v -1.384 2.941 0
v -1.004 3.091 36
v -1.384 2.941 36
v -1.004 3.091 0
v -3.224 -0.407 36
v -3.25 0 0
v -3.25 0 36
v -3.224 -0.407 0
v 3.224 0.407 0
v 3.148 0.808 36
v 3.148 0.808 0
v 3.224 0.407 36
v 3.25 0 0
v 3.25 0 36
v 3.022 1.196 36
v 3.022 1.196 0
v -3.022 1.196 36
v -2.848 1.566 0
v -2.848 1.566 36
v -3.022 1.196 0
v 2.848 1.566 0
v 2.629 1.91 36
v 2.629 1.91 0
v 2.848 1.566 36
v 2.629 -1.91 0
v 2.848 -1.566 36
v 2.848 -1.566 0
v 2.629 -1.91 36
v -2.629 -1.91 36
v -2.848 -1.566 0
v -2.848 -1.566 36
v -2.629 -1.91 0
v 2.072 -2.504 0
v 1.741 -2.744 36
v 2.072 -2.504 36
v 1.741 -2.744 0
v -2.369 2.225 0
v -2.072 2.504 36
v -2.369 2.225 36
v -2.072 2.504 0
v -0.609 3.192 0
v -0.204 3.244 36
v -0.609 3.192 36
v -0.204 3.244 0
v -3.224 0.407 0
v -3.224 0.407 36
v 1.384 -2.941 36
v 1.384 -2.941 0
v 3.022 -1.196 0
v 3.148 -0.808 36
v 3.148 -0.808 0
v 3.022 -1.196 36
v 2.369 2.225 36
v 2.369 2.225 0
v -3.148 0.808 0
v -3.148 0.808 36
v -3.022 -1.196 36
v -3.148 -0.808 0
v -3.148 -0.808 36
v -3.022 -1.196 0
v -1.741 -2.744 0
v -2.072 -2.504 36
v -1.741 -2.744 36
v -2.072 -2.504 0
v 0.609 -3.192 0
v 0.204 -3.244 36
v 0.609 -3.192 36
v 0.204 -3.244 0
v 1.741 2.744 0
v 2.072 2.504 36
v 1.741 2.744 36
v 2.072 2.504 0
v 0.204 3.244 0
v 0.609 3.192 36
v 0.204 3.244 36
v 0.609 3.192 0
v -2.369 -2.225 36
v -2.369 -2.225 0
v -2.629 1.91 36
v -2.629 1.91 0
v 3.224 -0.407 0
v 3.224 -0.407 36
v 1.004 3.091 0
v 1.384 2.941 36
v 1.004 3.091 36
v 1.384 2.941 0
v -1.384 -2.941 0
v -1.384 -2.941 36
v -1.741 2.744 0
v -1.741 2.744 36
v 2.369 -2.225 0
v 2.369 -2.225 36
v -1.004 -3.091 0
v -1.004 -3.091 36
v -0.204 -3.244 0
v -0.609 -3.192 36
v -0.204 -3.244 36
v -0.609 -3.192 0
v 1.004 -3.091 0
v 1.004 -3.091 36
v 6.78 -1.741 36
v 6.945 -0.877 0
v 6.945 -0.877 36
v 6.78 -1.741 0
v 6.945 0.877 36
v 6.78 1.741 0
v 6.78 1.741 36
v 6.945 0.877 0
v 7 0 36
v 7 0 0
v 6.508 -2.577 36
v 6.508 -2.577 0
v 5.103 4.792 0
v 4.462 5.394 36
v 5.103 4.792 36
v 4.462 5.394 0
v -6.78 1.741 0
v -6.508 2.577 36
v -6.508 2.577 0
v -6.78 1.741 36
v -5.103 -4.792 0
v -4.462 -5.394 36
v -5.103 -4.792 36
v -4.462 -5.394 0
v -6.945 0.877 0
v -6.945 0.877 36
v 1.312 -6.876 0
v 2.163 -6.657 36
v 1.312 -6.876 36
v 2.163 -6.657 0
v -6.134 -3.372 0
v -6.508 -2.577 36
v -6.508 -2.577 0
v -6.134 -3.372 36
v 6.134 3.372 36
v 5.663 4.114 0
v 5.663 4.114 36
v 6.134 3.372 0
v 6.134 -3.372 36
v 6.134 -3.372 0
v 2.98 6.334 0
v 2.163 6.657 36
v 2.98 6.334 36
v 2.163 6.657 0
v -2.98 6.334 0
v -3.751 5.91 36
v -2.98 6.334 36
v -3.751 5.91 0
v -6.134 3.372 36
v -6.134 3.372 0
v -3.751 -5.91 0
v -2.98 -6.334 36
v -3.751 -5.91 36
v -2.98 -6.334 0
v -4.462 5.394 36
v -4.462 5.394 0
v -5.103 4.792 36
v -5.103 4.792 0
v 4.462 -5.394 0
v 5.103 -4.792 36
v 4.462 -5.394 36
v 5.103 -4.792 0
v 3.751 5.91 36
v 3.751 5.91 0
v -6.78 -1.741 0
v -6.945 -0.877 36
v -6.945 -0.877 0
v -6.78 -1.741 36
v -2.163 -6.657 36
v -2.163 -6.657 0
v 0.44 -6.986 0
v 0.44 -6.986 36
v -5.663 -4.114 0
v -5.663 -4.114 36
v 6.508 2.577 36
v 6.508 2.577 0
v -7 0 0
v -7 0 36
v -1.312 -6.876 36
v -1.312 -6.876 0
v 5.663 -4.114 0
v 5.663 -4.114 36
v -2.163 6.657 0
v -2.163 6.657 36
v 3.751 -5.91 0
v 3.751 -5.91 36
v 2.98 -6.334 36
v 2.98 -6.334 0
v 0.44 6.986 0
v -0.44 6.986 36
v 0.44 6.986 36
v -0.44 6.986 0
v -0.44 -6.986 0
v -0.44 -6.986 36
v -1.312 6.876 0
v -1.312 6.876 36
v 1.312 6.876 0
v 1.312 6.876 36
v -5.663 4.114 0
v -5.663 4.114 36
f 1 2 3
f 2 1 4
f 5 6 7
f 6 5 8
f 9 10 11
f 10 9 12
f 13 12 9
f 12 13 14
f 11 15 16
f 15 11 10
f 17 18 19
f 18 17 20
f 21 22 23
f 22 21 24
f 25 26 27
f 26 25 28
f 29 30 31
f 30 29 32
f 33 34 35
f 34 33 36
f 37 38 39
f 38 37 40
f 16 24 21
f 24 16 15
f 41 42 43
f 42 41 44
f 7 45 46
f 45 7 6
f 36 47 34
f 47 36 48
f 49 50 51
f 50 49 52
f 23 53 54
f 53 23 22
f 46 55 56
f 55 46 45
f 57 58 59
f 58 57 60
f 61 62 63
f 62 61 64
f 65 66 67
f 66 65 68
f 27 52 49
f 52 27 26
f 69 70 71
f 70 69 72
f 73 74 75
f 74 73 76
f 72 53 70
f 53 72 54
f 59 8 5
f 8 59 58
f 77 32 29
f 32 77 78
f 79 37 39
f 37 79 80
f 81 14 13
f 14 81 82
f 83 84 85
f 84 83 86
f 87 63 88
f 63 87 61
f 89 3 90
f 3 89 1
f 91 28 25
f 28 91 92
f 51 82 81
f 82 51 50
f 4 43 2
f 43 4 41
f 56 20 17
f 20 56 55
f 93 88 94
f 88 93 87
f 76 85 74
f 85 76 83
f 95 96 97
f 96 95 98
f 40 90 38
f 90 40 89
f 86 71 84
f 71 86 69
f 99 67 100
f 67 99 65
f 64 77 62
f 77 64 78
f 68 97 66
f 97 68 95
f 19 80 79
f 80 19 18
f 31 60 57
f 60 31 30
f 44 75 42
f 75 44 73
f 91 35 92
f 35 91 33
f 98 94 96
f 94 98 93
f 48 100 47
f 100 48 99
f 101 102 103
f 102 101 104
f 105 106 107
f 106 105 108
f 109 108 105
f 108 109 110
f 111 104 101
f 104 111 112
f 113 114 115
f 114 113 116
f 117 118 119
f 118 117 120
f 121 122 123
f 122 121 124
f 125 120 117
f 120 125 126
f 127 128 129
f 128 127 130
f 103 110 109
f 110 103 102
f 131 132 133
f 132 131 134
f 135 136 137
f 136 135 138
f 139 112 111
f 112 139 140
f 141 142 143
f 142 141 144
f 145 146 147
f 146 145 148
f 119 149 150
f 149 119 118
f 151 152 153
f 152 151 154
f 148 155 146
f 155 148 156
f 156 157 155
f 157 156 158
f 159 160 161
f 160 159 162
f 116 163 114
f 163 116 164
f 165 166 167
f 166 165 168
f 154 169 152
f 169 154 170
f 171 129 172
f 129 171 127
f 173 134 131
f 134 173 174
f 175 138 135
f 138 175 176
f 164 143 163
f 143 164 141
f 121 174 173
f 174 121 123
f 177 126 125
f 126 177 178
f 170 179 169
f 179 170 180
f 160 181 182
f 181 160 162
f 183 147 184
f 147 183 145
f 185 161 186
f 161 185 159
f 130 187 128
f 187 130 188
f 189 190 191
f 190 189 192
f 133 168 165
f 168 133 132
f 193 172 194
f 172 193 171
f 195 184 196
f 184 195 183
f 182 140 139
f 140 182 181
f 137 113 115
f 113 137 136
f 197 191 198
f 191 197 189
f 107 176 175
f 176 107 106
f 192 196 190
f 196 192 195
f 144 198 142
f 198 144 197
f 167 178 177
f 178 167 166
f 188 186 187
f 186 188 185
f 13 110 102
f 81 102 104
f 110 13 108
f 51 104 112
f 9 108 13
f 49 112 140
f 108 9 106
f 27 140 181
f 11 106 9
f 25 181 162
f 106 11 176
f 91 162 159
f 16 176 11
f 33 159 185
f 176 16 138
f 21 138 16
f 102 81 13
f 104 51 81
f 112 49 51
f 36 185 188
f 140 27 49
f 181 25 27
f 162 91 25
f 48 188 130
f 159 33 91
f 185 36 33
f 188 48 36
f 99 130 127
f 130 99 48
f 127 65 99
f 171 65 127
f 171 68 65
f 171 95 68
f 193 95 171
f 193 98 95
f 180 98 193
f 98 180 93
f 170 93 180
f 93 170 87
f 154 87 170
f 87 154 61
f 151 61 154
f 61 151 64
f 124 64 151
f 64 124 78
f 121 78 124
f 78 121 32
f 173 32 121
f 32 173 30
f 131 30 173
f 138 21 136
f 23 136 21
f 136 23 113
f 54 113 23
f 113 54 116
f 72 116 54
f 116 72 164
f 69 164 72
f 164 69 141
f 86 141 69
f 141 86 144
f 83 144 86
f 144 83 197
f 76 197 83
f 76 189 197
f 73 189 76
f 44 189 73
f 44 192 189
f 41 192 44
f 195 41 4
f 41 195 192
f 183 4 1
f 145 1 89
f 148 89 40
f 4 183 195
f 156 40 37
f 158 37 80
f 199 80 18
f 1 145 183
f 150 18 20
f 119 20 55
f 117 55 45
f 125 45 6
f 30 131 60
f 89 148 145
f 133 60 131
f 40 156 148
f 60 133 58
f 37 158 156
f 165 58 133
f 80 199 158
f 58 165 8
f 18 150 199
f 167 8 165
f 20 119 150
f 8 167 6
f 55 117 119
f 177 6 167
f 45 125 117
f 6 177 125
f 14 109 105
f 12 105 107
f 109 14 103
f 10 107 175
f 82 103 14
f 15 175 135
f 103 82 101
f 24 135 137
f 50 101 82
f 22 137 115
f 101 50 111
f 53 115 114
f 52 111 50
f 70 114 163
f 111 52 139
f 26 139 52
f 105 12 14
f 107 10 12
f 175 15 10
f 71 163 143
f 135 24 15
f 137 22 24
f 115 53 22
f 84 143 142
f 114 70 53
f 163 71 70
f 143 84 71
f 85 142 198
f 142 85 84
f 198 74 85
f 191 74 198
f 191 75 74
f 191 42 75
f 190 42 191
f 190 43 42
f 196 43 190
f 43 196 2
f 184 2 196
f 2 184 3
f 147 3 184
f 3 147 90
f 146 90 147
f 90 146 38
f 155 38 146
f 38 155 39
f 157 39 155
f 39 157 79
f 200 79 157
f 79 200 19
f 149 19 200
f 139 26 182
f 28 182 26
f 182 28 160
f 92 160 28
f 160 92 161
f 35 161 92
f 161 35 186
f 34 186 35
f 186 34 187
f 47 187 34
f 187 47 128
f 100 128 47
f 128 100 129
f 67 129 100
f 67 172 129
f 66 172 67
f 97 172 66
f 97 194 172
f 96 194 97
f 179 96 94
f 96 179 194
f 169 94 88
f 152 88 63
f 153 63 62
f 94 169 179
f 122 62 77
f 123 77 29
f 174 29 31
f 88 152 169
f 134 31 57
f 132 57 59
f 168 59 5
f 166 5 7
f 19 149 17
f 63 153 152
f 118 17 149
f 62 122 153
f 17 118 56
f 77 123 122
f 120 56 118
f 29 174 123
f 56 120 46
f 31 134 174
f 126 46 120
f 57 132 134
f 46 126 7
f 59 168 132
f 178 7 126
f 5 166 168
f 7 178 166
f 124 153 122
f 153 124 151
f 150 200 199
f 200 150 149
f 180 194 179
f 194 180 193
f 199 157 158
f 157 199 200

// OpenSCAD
$fn = 50;


difference() {
	union() {
		*color(alpha = 1.0000000000, c = "gray") {
			translate(v = [0, 7, 0]) {
				linear_extrude(height = 1) {
					text(font = "Arial:style=Bold", halign = "center", size = 4.5000000000, text = "COMMENT plate main", valign = "center");
				}
			}
		}
		cylinder(h = 36, r = 7.0000000000);
	}
	union() {
		*color(alpha = 1.0000000000, c = "gray") {
			translate(v = [0, 7, 0]) {
				linear_extrude(height = 1) {
					text(font = "Arial:style=Bold", halign = "center", size = 4.5000000000, text = "COMMENT holes main", valign = "center");
				}
			}
		}
		translate(v = [0, 0, -100]) {
			cylinder(h = 200, r = 3.2500000000);
		}
		translate(v = [0, 0, -100]) {
			cylinder(h = 200, r = 1.8000000000);
		}
	}
}
